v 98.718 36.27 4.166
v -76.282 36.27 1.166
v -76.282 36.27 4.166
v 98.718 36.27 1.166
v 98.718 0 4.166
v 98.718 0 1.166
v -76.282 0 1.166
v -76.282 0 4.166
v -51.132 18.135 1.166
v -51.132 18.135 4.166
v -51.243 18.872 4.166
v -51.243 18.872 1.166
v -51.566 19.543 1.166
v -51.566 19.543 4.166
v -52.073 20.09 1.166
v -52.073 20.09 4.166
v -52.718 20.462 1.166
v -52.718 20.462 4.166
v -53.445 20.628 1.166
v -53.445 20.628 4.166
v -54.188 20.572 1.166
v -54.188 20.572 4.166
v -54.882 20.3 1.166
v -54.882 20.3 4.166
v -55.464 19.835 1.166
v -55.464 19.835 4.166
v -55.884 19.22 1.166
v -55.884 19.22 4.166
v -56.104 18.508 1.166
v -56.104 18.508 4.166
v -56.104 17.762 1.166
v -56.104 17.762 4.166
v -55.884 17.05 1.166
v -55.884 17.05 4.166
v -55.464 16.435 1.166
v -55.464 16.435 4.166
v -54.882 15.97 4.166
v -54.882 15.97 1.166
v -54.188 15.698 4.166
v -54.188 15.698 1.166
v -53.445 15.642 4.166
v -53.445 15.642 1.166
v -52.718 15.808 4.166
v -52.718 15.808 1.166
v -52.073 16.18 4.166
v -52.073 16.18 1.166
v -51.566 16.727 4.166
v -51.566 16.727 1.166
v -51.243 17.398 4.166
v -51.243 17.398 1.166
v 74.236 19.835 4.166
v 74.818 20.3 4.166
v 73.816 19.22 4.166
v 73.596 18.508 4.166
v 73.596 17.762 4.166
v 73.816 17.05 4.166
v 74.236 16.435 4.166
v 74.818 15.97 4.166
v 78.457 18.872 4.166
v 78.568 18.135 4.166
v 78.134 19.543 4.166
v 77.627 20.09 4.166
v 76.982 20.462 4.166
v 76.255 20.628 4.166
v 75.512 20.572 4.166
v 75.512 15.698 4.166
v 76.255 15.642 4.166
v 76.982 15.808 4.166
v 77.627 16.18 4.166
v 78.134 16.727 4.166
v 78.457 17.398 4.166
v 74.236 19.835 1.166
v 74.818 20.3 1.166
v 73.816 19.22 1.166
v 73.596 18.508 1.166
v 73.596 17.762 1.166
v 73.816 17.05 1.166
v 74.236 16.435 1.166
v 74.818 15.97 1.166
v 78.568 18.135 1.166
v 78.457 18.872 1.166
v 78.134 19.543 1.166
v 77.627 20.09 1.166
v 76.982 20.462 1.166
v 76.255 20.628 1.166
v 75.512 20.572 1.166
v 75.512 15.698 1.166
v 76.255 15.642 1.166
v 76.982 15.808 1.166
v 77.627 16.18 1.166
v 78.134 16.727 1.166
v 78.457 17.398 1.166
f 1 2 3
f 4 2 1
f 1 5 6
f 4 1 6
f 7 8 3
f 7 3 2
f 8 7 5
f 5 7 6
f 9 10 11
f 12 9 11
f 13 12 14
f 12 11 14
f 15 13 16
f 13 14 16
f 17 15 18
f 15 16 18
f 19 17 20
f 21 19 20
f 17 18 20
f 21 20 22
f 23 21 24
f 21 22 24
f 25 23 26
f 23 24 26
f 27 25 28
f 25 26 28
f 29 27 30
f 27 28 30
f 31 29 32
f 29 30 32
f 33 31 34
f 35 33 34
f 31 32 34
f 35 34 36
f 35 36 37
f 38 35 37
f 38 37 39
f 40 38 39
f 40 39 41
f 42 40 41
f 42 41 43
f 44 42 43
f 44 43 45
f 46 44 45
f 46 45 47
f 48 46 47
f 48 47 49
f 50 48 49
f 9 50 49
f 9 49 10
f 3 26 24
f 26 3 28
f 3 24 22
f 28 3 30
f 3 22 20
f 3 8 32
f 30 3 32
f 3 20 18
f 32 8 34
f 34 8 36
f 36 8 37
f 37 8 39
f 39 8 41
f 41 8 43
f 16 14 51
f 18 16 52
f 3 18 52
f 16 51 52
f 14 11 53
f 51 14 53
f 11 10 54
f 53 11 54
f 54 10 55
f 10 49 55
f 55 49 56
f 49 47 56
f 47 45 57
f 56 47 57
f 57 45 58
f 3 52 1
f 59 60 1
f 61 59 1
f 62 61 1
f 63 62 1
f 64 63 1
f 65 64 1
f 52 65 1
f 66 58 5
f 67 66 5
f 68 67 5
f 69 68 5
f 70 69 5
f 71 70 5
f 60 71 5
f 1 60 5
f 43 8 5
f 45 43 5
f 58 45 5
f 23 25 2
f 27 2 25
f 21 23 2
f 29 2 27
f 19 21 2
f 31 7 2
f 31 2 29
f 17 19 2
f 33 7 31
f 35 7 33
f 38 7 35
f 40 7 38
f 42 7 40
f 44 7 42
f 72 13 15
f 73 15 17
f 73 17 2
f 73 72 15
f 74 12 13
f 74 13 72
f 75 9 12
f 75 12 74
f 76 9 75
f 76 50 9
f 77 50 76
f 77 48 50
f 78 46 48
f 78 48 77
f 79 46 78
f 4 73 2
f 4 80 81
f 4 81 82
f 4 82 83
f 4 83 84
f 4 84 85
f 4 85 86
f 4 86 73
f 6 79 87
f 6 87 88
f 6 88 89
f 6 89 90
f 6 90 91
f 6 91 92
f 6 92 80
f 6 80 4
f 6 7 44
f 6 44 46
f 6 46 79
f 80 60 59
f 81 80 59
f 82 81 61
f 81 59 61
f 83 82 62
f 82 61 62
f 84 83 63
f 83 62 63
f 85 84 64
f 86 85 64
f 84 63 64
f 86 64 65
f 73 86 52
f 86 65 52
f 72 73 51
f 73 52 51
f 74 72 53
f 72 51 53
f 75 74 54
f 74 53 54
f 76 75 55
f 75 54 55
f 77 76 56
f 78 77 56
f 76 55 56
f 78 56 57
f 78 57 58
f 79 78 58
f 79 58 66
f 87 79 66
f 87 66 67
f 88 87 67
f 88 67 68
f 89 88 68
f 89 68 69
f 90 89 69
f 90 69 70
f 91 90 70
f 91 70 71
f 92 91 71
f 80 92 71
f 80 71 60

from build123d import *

# Parameters (mm, degrees)
ESQUISSE2_W             = 175
ESQUISSE2_H             = 3
BOSS_EXTRU_1_DEPTH      = 36.27
ESQUISSE3_R             = 2.5
ENL_V_MAT_EXTRU_1_DEPTH = 106.213182302


with BuildPart() as part:
    # Esquisse2 → Boss.-Extru.1 (new body)
    with BuildSketch(Plane(origin=(0, 0, 0), x_dir=(1, 0, 0), z_dir=(0, 1, 0))):
        with Locations((11.218290251, -2.666038947)):
            Rectangle(ESQUISSE2_W, ESQUISSE2_H)
    extrude(amount=BOSS_EXTRU_1_DEPTH)

    # Esquisse3 → Enlèv. mat.-Extru.1 (cut, through all)
    with BuildSketch(Plane.XY.offset(4.166038947)):
        with Locations((-53.631709749, 18.135)):
            Circle(ESQUISSE3_R)
        with Locations((76.068290251, 18.135)):
            Circle(ESQUISSE3_R)
    extrude(amount=-ENL_V_MAT_EXTRU_1_DEPTH, mode=Mode.SUBTRACT)


solid = part.part
